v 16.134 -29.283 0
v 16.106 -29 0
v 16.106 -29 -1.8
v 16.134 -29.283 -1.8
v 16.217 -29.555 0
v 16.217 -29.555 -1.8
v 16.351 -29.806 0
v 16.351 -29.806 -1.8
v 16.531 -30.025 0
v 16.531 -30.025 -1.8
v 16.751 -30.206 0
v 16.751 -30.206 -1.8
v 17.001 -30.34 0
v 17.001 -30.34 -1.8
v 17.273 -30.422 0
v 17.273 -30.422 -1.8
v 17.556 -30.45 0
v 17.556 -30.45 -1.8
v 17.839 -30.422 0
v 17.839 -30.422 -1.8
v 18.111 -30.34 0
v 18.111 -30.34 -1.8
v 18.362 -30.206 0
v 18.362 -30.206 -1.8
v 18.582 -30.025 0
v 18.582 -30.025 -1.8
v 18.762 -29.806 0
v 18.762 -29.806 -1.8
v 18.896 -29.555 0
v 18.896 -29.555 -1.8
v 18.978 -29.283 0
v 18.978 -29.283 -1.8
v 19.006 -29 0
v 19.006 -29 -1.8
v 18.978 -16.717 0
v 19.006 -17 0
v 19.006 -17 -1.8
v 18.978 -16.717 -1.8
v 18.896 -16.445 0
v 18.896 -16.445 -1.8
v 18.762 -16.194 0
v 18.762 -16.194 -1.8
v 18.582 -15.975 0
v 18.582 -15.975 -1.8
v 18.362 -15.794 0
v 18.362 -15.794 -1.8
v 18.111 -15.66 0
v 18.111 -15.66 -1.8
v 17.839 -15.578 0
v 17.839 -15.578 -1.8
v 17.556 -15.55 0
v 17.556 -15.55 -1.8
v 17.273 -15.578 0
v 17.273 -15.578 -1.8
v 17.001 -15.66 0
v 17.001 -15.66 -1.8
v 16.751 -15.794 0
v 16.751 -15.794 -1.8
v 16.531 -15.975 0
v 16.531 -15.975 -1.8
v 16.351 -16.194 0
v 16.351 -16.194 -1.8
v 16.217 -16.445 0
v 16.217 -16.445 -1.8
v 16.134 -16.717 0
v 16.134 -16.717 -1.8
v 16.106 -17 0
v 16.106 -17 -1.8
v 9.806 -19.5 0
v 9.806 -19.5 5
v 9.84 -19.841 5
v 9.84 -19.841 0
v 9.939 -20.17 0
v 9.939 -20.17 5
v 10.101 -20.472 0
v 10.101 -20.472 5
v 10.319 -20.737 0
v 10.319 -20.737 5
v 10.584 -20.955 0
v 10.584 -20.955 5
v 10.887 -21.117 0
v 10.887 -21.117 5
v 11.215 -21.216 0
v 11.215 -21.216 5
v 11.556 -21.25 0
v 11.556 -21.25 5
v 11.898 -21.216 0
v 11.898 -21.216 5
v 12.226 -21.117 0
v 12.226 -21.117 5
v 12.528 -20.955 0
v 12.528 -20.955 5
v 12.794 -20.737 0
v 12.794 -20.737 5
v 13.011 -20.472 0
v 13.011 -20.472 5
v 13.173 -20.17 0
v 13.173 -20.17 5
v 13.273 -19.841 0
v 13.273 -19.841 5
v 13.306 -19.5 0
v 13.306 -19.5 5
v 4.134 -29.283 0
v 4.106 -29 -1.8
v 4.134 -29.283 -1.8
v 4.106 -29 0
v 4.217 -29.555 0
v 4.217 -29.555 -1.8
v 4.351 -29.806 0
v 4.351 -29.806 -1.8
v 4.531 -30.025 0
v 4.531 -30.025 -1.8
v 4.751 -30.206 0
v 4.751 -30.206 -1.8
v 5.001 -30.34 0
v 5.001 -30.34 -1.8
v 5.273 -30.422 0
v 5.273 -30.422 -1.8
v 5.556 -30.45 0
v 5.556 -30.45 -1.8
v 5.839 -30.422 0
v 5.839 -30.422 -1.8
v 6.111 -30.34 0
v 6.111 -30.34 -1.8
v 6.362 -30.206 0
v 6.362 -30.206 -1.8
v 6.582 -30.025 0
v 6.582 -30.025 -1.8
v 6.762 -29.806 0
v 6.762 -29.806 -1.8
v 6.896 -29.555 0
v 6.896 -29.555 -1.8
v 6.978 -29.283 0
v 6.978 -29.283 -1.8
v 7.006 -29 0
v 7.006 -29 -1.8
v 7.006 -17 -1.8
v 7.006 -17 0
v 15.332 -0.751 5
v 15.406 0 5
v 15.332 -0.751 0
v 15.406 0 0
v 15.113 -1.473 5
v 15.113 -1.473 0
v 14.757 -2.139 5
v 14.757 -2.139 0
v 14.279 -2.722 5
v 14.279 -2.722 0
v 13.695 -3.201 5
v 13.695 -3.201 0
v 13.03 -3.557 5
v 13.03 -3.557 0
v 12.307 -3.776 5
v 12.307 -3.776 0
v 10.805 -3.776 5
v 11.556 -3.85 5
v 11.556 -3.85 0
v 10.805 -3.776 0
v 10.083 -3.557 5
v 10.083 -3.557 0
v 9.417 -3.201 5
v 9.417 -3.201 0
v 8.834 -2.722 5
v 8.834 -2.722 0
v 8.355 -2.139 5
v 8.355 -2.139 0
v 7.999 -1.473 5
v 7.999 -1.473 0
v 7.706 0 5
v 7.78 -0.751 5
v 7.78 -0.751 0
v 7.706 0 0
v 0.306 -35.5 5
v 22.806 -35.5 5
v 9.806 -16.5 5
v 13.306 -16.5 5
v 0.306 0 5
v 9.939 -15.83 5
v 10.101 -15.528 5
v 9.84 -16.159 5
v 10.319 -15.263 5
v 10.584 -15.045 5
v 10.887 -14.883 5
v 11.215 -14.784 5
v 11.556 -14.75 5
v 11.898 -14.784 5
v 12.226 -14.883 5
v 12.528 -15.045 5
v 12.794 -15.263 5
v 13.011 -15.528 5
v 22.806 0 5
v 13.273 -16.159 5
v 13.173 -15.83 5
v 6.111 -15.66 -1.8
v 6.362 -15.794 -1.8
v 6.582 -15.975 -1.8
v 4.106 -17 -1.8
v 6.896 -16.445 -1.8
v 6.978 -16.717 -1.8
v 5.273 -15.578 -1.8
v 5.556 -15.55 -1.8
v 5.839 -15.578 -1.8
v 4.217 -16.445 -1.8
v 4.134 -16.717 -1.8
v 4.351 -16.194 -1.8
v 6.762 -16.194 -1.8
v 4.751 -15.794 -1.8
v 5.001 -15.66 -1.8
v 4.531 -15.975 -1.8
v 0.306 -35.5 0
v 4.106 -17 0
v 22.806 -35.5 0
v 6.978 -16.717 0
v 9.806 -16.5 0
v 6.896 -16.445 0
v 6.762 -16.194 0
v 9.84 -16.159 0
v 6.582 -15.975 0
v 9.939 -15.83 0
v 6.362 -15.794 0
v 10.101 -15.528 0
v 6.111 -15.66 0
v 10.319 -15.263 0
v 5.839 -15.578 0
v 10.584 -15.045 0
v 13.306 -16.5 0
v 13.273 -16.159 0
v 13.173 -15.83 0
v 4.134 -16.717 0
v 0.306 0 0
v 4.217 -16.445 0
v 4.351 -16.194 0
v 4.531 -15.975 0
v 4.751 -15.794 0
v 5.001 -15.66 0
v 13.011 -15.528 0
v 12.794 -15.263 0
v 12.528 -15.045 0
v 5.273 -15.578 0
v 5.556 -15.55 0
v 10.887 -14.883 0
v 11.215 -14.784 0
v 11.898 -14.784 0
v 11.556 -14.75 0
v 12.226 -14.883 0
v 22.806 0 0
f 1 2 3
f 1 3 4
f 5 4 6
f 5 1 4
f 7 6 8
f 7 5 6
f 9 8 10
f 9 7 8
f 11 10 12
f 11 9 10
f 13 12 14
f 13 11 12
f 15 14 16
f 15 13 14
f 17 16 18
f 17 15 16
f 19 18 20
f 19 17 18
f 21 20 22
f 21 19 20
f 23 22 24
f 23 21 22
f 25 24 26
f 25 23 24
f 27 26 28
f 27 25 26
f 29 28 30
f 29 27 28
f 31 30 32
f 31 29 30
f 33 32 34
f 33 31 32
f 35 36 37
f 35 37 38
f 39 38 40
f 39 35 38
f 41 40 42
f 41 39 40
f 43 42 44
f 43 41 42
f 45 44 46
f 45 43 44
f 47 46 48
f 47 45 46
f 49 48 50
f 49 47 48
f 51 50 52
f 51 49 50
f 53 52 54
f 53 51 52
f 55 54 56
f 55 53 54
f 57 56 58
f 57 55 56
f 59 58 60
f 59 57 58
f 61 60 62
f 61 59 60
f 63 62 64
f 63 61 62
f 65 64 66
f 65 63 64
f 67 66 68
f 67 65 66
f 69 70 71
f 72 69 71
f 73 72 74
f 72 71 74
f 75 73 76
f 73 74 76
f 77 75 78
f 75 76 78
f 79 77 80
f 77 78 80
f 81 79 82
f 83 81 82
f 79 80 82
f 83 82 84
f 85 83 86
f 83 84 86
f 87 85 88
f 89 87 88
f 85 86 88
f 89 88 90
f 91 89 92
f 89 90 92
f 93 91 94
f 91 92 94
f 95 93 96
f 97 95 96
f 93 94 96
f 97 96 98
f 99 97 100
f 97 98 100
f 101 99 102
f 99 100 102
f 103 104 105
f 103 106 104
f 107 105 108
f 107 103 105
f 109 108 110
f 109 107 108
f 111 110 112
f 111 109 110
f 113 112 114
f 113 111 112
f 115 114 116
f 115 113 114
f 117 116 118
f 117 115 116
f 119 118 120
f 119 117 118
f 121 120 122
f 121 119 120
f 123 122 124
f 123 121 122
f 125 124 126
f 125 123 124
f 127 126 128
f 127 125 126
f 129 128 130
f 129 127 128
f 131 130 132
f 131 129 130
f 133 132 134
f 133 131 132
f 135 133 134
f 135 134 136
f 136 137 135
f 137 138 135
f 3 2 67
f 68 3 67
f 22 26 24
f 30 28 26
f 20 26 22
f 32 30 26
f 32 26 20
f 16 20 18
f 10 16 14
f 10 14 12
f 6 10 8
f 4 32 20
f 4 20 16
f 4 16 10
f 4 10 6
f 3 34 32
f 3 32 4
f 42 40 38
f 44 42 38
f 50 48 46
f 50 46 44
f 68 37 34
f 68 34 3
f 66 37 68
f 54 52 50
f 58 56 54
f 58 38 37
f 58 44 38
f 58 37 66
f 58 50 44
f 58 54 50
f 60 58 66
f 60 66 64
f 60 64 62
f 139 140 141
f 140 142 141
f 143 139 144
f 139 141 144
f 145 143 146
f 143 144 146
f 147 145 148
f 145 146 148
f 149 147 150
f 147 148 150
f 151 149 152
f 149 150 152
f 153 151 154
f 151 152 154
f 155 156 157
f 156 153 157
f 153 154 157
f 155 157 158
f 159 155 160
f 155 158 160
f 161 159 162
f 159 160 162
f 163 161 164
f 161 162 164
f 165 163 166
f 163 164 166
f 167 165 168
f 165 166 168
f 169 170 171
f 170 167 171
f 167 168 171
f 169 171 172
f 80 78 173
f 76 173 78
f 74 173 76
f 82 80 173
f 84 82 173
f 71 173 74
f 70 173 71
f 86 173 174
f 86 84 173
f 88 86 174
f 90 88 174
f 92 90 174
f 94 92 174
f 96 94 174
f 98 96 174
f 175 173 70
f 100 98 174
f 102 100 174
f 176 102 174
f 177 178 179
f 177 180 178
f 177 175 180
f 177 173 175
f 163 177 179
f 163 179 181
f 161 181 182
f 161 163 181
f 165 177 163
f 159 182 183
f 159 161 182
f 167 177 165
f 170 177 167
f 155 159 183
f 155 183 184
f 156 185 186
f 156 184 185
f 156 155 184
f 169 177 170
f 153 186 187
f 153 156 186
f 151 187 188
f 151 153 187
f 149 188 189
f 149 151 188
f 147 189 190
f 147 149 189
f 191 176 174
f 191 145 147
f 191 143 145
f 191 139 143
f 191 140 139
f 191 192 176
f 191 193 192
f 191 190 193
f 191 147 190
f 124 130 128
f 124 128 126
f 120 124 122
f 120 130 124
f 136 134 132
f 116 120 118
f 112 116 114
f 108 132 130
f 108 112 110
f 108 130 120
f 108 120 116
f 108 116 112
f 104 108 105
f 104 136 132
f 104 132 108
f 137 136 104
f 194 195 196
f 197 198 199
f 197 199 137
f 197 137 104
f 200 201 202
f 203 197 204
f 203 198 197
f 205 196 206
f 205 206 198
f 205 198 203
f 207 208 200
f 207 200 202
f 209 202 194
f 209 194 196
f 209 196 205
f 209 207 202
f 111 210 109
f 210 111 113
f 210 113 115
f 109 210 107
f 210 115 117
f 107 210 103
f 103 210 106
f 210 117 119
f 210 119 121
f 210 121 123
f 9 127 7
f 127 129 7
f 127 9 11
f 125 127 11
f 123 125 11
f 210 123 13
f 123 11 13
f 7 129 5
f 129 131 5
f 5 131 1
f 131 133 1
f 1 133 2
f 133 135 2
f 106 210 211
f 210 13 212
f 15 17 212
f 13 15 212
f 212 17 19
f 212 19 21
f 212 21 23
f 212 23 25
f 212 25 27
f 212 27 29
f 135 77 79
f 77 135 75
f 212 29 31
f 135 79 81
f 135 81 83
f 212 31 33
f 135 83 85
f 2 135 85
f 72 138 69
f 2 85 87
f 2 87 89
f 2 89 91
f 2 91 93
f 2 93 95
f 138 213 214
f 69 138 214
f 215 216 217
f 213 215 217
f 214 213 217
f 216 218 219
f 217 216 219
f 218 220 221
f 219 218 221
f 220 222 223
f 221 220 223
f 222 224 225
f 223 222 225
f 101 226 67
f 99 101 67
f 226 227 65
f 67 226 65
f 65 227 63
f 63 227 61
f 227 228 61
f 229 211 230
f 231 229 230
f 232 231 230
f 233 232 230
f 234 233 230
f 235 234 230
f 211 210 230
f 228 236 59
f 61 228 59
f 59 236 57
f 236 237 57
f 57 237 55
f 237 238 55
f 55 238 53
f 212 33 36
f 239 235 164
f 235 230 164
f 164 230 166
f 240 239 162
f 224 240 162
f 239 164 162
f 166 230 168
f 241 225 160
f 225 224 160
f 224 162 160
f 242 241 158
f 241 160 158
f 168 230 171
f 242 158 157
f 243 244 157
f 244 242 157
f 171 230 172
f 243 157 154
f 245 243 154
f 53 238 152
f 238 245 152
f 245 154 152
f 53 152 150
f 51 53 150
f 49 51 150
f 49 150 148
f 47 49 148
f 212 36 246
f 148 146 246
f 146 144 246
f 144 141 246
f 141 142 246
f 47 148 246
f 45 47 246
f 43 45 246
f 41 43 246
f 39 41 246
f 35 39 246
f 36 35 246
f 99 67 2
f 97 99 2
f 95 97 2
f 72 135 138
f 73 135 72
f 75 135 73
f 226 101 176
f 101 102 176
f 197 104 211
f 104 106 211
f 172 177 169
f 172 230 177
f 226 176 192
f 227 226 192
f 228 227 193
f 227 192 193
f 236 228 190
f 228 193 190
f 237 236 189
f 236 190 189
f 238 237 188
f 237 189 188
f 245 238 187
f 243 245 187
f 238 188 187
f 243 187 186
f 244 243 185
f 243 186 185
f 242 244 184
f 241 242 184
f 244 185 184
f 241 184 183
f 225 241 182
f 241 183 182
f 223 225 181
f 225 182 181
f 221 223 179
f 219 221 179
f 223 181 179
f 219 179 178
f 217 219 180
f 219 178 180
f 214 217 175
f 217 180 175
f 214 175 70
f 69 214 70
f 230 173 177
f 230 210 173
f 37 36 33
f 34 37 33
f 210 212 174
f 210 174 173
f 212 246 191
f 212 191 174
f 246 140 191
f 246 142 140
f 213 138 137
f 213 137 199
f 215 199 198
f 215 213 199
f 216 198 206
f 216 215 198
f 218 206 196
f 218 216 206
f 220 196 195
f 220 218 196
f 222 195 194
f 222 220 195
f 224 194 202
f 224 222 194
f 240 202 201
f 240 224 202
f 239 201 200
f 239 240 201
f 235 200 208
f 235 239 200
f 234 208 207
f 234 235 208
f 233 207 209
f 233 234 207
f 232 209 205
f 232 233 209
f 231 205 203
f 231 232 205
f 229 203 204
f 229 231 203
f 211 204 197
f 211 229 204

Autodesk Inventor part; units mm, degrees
ref_plane "YZ Plane" through (0, 0, 0) normal (1, 0, 0) x (0, 1, 0)
ref_plane "XZ Plane" through (0, 0, 0) normal (0, 1, 0) x (-1, 0, 0)
ref_plane "XY Plane" through (0, 0, 0) normal (0, 0, 1) x (1, 0, 0)
ref_plane "Work Plane1" through (0, 0, 0) normal (0, 0, 1) x (1, 0, 0)
sketch "Sketch1" plane through (0, 0, 0) normal (0, 0, 1) x (1, 0, 0)
  circle A0 centre (11.5562, -18) radius 2 construction
  line L0 (-53.1938, -16) -> (-53.1938, -30) construction
  arc A1 (-56.1938, -30) -> (-53.1938, -30) centre (-54.6938, -30) ccw construction
  line L1 (-56.1938, -30) -> (-56.1938, -16) construction
  arc A2 (-53.1938, -16) -> (-56.1938, -16) centre (-54.6938, -16) ccw construction
  line L2 (7.0562, -16) -> (7.0562, -30) construction
  arc A3 (4.0562, -30) -> (7.0562, -30) centre (5.5562, -30) ccw construction
  line L3 (4.0562, -30) -> (4.0562, -16) construction
  arc A4 (7.0562, -16) -> (4.0562, -16) centre (5.5562, -16) ccw construction
  line L4 (-13.1938, -16) -> (-13.1938, -30) construction
  arc A5 (-16.1938, -30) -> (-13.1938, -30) centre (-14.6938, -30) ccw construction
  line L5 (-16.1938, -30) -> (-16.1938, -16) construction
  arc A6 (-13.1938, -16) -> (-16.1938, -16) centre (-14.6938, -16) ccw construction
  arc A7 (19.0562, -16) -> (16.0562, -16) centre (17.5562, -16) ccw construction
  line L6 (19.0562, -16) -> (19.0562, -30) construction
  arc A8 (16.0562, -30) -> (19.0562, -30) centre (17.5562, -30) ccw construction
  line L7 (16.0562, -30) -> (16.0562, -16) construction
  line L8 (22.8064, -40) -> (22.8064, 45) construction
  line L9 (22.8064, 45) -> (-120, 45) construction
  line L10 (-120, 27.5563) -> (-120, 45) construction
  line L11 (-120, 27.5563) -> (-95.2035, 27.5563) construction
  arc A9 (-85.0841, 27.5563) -> (-95.2035, 27.5563) centre (-90.1438, 25.4) ccw construction
  line L12 (-85.0841, 27.5563) -> (17.8062, 27.5563) construction
  line L13 (17.8062, 27.5563) -> (17.8062, -11) construction
  line L14 (17.8062, -11) -> (-120, -11) construction
  line L15 (-120, -40) -> (-120, -11) construction
  line L16 (22.8064, -40) -> (-120, -40) construction
  circle A10 centre (-111.1938, -18) radius 2 construction
  circle A11 centre (-98.1938, -18) radius 2 construction
  circle A12 centre (-61.1938, -18) radius 2 construction
  circle A13 centre (-48.1938, -18) radius 2 construction
  circle A14 centre (-21.1938, -18) radius 2 construction
  circle A15 centre (-8.1938, -18) radius 2 construction
  circle A16 centre (-21.1938, 33.6563) radius 2 construction
  circle A17 centre (-8.1938, 33.6563) radius 2 construction
  circle A18 centre (-61.1938, 33.6563) radius 2 construction
  circle A19 centre (-48.1938, 33.6563) radius 2 construction
  circle A20 centre (-111.1938, 33.6563) radius 2 construction
  circle A21 centre (-98.1938, 33.6563) radius 2 construction
  circle A22 centre (-90.1438, -25.4) radius 5.5 construction
  line L17 (5.3062, -11) -> (5.3062, 11) construction
  line L18 (17.8062, -11) -> (17.8062, 11) construction
  circle A23 centre (11.5562, 0) radius 3.75 construction
  line L19 (5.3062, -11) -> (17.8062, -11) construction
  arc A24 (-18.6938, -19.75) -> (-18.6938, -16.25) centre (-18.6938, -18) ccw construction
  line L20 (-18.6938, -16.25) -> (-23.6938, -16.25) construction
  arc A25 (-23.6938, -16.25) -> (-23.6938, -19.75) centre (-23.6938, -18) ccw construction
  line L21 (-23.6938, -19.75) -> (-18.6938, -19.75) construction
  arc A26 (-5.6938, -19.75) -> (-5.6938, -16.25) centre (-5.6938, -18) ccw construction
  line L22 (-5.6938, -16.25) -> (-10.6938, -16.25) construction
  arc A27 (-10.6938, -16.25) -> (-10.6938, -19.75) centre (-10.6938, -18) ccw construction
  line L23 (-10.6938, -19.75) -> (-5.6938, -19.75) construction
  line L24 (0.3062, -11) -> (0.3062, -25.3437) construction
  line L25 (0.3062, -25.3437) -> (-29.6938, -25.3437) construction
  line L26 (-29.6938, -11) -> (-29.6938, -25.3437) construction
  line L27 (0.3062, -11) -> (-29.6938, -11) construction
  line L28 (22.8064, -35.5) -> (0.3062, -35.5)
  line L29 (0.3062, -35.5) -> (0.3062, 0)
  line L30 (0.3062, 0) -> (7.7062, 0)
  line L31 (22.8064, 0) -> (22.8064, -35.5)
  arc A28 (7.7062, 0) -> (15.4062, 0) centre (11.5562, 0) ccw
  line L32 (11.5562, 15.4) -> (11.5562, -15.4) construction
  line L33 (-148.5613, 0) -> (51.3677, 0) construction
  line L34 (15.4062, 0) -> (22.8064, 0)
  point P0 (0, 0)
  point P1 (17.5562, -31.5)
  dimension "d0" = 0.1
  dimension "d1" = 0
  dimension "d2" = 0
  dimension "d3" = 4
extrude "Main Body" add sketch "Sketch1" along normal blind 5
sketch "Sketch2" plane through (0, 0, 0) normal (0, 0, -1) x (-1, 0, 0)
  line L0 (-16.0562, -30) -> (-16.0562, -16) construction
  arc A0 (-19.0562, -30) -> (-16.0562, -30) centre (-17.5562, -30) ccw construction
  line L1 (-19.0562, -16) -> (-19.0562, -30) construction
  arc A1 (-16.0562, -16) -> (-19.0562, -16) centre (-17.5562, -16) ccw construction
  arc A2 (-7.0562, -30) -> (-4.0562, -30) centre (-5.5562, -30) ccw construction
  line L2 (-7.0562, -16) -> (-7.0562, -30) construction
  arc A3 (-4.0562, -16) -> (-7.0562, -16) centre (-5.5562, -16) ccw construction
  line L3 (-4.0562, -30) -> (-4.0562, -16) construction
  line L4 (-17.5562, -30) -> (-17.5562, -16) construction
  line L5 (-5.5562, -16) -> (-5.5562, -30) construction
  line L6 (-17.5562, -29) -> (-17.5562, -17) construction
  line L7 (-16.1062, -29) -> (-16.1062, -17)
  line L8 (-19.0062, -17) -> (-19.0062, -29)
  arc A4 (-19.0062, -29) -> (-16.1062, -29) centre (-17.5562, -29) ccw
  arc A5 (-16.1062, -17) -> (-19.0062, -17) centre (-17.5562, -17) ccw
  line L9 (-5.5562, -29) -> (-5.5562, -17) construction
  line L10 (-4.1062, -29) -> (-4.1062, -17)
  line L11 (-7.0062, -17) -> (-7.0062, -29)
  arc A6 (-7.0062, -29) -> (-4.1062, -29) centre (-5.5562, -29) ccw
  arc A7 (-4.1062, -17) -> (-7.0062, -17) centre (-5.5562, -17) ccw
  line L12 (-17.5562, -29) -> (-5.5562, -29) construction
  line L13 (-17.5562, -17) -> (-5.5562, -17) construction
  point P0 (0, 0)
  point P1 (-17.5562, -23)
  point P2 (-5.5562, -23)
  dimension "d6" = 1
  dimension "d7" = 0.05
  dimension "d8" = 0.05
extrude "Alignment Tabs" add sketch "Sketch2" along normal blind 1.8
sketch "Sketch3" plane through (0, 0, 5) normal (0, 0, 1) x (1, 0, 0)
  circle A0 centre (11.5562, -18) radius 2 construction
  line L0 (11.5562, -19.5) -> (11.5562, -16.5) construction
  line L1 (13.3062, -19.5) -> (13.3062, -16.5)
  line L2 (9.8062, -16.5) -> (9.8062, -19.5)
  arc A1 (9.8062, -19.5) -> (13.3062, -19.5) centre (11.5562, -19.5) ccw
  arc A2 (13.3062, -16.5) -> (9.8062, -16.5) centre (11.5562, -16.5) ccw
  point P0 (0, 0)
  dimension "d11" = 3.5
  dimension "d12" = 3
extrude "Slot for Screw M3" cut sketch "Sketch3" against normal through all
equation "\"d8\" = d7"
properties part number "Cuvette Aligner 10mm"
